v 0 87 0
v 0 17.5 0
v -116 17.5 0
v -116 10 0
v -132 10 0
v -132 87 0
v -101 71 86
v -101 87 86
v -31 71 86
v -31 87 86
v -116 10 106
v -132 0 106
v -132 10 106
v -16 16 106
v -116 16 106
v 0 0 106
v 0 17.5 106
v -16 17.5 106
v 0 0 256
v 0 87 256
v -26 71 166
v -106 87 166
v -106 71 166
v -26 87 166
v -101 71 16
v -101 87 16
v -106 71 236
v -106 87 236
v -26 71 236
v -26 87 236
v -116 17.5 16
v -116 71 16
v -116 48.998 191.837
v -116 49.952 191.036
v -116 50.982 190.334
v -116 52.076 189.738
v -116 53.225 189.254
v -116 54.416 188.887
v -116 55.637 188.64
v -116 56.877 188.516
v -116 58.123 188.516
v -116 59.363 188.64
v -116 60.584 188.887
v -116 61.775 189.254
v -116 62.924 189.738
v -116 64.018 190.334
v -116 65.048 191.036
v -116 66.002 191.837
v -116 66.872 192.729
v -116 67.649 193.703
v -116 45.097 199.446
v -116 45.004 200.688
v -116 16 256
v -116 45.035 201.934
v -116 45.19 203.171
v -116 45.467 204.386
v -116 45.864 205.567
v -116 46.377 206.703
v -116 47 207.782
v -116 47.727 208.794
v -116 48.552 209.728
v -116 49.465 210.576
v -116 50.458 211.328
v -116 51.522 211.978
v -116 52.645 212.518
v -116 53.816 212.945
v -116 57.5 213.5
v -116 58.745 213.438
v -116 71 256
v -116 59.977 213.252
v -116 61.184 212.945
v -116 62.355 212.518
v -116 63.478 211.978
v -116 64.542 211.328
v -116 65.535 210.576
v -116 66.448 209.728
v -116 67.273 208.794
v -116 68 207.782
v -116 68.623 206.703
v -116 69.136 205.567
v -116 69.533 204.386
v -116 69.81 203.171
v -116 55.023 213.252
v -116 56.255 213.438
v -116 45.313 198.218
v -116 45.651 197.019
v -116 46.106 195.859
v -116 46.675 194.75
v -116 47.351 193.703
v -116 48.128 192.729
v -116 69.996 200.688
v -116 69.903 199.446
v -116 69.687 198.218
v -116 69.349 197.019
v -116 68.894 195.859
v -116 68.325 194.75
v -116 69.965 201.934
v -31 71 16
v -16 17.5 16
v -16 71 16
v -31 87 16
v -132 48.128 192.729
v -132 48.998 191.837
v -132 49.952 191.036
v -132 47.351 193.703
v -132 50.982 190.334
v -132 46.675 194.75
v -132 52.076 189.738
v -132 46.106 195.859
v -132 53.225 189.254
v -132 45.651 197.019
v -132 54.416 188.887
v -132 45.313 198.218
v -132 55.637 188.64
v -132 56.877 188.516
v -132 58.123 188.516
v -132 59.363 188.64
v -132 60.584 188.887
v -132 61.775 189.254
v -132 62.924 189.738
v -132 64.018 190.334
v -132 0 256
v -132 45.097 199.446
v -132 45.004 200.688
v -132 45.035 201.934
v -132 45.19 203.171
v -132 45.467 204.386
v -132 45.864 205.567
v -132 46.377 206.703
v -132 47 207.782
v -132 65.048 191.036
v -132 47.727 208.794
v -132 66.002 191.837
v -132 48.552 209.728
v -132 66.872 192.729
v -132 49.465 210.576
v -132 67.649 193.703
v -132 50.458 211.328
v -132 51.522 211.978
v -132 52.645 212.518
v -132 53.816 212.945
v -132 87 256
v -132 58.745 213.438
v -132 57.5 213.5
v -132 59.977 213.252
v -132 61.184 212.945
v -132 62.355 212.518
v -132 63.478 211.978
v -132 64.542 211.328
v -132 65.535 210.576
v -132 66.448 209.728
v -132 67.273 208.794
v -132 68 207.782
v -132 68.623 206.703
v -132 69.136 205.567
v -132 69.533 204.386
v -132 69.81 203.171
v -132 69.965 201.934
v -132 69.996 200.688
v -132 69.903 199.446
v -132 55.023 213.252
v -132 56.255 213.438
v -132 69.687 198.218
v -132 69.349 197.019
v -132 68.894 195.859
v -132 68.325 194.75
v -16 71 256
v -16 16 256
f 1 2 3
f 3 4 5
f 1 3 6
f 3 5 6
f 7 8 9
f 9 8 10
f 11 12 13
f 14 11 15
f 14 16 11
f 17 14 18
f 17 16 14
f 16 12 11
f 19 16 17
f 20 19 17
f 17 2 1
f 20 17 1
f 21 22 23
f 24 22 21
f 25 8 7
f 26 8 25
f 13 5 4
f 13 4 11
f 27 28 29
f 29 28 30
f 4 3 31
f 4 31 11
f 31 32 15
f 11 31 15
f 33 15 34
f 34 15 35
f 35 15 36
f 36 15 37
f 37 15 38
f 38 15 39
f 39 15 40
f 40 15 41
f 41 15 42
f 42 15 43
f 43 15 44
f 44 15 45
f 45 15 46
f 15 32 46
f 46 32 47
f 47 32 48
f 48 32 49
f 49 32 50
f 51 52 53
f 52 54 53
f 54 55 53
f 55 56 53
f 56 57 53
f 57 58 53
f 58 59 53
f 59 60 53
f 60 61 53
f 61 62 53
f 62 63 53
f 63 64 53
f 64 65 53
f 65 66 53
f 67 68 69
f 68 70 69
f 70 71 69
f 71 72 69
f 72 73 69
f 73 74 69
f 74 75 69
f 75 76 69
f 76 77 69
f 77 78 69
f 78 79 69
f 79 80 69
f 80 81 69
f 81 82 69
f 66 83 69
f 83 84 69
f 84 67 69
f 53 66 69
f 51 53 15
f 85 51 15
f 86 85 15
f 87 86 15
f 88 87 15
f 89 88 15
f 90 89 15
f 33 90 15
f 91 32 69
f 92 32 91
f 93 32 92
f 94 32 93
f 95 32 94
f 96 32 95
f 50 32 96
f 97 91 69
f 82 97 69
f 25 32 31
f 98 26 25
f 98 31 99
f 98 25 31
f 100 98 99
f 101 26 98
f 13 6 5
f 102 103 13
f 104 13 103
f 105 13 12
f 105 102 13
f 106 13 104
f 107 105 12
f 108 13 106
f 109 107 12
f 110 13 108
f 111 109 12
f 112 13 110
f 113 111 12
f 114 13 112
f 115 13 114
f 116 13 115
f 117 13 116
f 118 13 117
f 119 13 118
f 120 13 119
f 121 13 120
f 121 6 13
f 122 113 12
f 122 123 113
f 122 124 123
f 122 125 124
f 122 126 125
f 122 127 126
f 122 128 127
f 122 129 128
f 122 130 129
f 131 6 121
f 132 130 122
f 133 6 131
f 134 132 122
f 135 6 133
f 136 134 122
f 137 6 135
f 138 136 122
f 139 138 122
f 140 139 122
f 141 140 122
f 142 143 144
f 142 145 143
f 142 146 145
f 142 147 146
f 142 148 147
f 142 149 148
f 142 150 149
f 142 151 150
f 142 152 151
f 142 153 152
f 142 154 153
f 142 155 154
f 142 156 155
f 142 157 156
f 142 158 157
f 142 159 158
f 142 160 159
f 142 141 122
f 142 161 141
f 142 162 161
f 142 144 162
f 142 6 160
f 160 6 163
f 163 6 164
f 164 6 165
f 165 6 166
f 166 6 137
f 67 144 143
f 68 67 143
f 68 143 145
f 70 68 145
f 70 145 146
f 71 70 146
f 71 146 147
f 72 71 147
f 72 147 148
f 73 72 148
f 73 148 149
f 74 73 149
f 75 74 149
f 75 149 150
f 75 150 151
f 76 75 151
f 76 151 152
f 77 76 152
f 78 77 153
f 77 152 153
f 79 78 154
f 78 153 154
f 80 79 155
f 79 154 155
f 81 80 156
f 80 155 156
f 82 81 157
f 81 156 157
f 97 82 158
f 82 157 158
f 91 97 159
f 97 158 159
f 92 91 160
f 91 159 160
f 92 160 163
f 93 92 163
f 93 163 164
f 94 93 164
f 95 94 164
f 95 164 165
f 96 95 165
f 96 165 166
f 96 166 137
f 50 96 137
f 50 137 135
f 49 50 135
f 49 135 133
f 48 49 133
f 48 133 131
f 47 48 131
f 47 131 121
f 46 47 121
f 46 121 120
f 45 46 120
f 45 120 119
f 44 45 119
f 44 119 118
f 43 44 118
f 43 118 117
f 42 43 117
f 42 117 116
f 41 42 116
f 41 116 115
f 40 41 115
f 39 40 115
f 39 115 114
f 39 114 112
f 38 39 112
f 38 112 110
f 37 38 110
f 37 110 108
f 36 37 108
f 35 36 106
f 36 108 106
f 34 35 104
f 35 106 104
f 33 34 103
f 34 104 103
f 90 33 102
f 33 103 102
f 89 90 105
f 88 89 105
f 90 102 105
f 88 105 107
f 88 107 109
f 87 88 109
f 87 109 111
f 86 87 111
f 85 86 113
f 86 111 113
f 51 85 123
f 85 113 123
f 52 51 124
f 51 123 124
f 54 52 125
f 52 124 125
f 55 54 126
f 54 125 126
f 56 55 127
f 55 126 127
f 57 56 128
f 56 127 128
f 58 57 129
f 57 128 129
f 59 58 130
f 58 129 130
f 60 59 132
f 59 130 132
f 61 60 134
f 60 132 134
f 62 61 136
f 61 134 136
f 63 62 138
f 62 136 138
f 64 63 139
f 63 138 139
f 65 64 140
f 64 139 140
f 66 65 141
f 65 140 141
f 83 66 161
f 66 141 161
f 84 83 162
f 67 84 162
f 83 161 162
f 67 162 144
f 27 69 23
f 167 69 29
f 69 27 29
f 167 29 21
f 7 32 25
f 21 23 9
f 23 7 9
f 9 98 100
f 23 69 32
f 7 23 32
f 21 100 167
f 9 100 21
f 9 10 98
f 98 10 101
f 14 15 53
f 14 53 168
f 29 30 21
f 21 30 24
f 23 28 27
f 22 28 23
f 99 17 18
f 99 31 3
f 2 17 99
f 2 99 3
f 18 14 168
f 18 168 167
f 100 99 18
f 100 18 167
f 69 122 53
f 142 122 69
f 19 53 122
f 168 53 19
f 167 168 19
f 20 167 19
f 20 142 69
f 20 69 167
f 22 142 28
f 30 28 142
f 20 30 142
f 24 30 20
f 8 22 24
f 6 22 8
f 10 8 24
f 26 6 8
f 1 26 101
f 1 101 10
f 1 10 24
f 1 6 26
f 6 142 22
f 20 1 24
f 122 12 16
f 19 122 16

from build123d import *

# Parameters (mm, degrees)
SKETCH1_W           = 132
SKETCH1_H           = 87
SKETCH1_W_2         = 100
SKETCH1_H_2         = 55
BOSS_EXTRUDE1_DEPTH = 256
CUT_EXTRUDE1_REACH  = 89
SKETCH4_W           = 80
SKETCH4_H           = 70
CUT_EXTRUDE2_REACH  = 89
SKETCH5_W           = 70
SKETCH5_H           = 70
SKETCH6_W           = 100
SKETCH6_H           = 55
BOSS_EXTRUDE2_DEPTH = 16
SKETCH7_W           = 106
SKETCH7_H           = 17.5
CUT_EXTRUDE3_DEPTH  = 133
SKETCH9_W           = 106
SKETCH9_H           = 7.5
BOSS_EXTRUDE4_DEPTH = 16
CUT_EXTRUDE4_REACH  = 134
SKETCH10_R          = 12.5


with BuildPart() as part:
    # Sketch1 → Boss-Extrude1 (new body)
    with BuildSketch(Plane.XY):
        with Locations((-66, 43.5)):
            Rectangle(SKETCH1_W, SKETCH1_H)
        with Locations((-66, 43.5)):
            Rectangle(SKETCH1_W_2, SKETCH1_H_2, mode=Mode.SUBTRACT)
    extrude(amount=BOSS_EXTRUDE1_DEPTH)

    # Sketch4 → Cut-Extrude1 (cut, up to next)
    with BuildSketch(Plane(origin=(0, 87, 0), x_dir=(1, 0, 0), z_dir=(0, 1, 0)), mode=Mode.PRIVATE) as cut_extrude1_sk1:
        with Locations((-66, -201)):
            Rectangle(SKETCH4_W, SKETCH4_H)
    cut_extrude1_tool1 = extrude(cut_extrude1_sk1.sketch, amount=-CUT_EXTRUDE1_REACH, mode=Mode.PRIVATE) & part.part
    add(cut_extrude1_tool1.solids().sort_by_distance((-66, 87, 201))[0], mode=Mode.SUBTRACT)

    # Sketch5 → Cut-Extrude2 (cut, up to next)
    with BuildSketch(Plane(origin=(0, 87, 0), x_dir=(1, 0, 0), z_dir=(0, 1, 0)), mode=Mode.PRIVATE) as cut_extrude2_sk1:
        with Locations((-66, -51)):
            Rectangle(SKETCH5_W, SKETCH5_H)
    cut_extrude2_tool1 = extrude(cut_extrude2_sk1.sketch, amount=-CUT_EXTRUDE2_REACH, mode=Mode.PRIVATE) & part.part
    add(cut_extrude2_tool1.solids().sort_by_distance((-66, 87, 51))[0], mode=Mode.SUBTRACT)

    # Sketch6 → Boss-Extrude2 (add)
    with BuildSketch(Plane(origin=(0, 0, 0), x_dir=(-1, 0, 0), z_dir=(0, 0, -1))):
        with Locations((66, 43.5)):
            Rectangle(SKETCH6_W, SKETCH6_H)
    extrude(amount=-BOSS_EXTRUDE2_DEPTH)

    # Sketch7 → Cut-Extrude3 (cut, through all)
    with BuildSketch(Plane(origin=(0, 0, 0), x_dir=(0, 0, -1), z_dir=(1, 0, 0))):
        with Locations((-53, 8.75)):
            Rectangle(SKETCH7_W, SKETCH7_H)
    extrude(amount=-CUT_EXTRUDE3_DEPTH, mode=Mode.SUBTRACT)

    # Sketch9 → Boss-Extrude4 (add)
    with BuildSketch(Plane.ZY.offset(132)):
        with Locations((53, 13.75)):
            Rectangle(SKETCH9_W, SKETCH9_H)
    extrude(amount=-BOSS_EXTRUDE4_DEPTH)

    # Sketch10 → Cut-Extrude4 (cut, up to next)
    with BuildSketch(Plane.ZY.offset(132), mode=Mode.PRIVATE) as cut_extrude4_sk1:
        with Locations((201, 57.5)):
            Circle(SKETCH10_R)
    cut_extrude4_tool1 = extrude(cut_extrude4_sk1.sketch, amount=-CUT_EXTRUDE4_REACH, mode=Mode.PRIVATE) & part.part
    add(cut_extrude4_tool1.solids().sort_by_distance((-132, 57.5, 201))[0], mode=Mode.SUBTRACT)


solid = part.part
